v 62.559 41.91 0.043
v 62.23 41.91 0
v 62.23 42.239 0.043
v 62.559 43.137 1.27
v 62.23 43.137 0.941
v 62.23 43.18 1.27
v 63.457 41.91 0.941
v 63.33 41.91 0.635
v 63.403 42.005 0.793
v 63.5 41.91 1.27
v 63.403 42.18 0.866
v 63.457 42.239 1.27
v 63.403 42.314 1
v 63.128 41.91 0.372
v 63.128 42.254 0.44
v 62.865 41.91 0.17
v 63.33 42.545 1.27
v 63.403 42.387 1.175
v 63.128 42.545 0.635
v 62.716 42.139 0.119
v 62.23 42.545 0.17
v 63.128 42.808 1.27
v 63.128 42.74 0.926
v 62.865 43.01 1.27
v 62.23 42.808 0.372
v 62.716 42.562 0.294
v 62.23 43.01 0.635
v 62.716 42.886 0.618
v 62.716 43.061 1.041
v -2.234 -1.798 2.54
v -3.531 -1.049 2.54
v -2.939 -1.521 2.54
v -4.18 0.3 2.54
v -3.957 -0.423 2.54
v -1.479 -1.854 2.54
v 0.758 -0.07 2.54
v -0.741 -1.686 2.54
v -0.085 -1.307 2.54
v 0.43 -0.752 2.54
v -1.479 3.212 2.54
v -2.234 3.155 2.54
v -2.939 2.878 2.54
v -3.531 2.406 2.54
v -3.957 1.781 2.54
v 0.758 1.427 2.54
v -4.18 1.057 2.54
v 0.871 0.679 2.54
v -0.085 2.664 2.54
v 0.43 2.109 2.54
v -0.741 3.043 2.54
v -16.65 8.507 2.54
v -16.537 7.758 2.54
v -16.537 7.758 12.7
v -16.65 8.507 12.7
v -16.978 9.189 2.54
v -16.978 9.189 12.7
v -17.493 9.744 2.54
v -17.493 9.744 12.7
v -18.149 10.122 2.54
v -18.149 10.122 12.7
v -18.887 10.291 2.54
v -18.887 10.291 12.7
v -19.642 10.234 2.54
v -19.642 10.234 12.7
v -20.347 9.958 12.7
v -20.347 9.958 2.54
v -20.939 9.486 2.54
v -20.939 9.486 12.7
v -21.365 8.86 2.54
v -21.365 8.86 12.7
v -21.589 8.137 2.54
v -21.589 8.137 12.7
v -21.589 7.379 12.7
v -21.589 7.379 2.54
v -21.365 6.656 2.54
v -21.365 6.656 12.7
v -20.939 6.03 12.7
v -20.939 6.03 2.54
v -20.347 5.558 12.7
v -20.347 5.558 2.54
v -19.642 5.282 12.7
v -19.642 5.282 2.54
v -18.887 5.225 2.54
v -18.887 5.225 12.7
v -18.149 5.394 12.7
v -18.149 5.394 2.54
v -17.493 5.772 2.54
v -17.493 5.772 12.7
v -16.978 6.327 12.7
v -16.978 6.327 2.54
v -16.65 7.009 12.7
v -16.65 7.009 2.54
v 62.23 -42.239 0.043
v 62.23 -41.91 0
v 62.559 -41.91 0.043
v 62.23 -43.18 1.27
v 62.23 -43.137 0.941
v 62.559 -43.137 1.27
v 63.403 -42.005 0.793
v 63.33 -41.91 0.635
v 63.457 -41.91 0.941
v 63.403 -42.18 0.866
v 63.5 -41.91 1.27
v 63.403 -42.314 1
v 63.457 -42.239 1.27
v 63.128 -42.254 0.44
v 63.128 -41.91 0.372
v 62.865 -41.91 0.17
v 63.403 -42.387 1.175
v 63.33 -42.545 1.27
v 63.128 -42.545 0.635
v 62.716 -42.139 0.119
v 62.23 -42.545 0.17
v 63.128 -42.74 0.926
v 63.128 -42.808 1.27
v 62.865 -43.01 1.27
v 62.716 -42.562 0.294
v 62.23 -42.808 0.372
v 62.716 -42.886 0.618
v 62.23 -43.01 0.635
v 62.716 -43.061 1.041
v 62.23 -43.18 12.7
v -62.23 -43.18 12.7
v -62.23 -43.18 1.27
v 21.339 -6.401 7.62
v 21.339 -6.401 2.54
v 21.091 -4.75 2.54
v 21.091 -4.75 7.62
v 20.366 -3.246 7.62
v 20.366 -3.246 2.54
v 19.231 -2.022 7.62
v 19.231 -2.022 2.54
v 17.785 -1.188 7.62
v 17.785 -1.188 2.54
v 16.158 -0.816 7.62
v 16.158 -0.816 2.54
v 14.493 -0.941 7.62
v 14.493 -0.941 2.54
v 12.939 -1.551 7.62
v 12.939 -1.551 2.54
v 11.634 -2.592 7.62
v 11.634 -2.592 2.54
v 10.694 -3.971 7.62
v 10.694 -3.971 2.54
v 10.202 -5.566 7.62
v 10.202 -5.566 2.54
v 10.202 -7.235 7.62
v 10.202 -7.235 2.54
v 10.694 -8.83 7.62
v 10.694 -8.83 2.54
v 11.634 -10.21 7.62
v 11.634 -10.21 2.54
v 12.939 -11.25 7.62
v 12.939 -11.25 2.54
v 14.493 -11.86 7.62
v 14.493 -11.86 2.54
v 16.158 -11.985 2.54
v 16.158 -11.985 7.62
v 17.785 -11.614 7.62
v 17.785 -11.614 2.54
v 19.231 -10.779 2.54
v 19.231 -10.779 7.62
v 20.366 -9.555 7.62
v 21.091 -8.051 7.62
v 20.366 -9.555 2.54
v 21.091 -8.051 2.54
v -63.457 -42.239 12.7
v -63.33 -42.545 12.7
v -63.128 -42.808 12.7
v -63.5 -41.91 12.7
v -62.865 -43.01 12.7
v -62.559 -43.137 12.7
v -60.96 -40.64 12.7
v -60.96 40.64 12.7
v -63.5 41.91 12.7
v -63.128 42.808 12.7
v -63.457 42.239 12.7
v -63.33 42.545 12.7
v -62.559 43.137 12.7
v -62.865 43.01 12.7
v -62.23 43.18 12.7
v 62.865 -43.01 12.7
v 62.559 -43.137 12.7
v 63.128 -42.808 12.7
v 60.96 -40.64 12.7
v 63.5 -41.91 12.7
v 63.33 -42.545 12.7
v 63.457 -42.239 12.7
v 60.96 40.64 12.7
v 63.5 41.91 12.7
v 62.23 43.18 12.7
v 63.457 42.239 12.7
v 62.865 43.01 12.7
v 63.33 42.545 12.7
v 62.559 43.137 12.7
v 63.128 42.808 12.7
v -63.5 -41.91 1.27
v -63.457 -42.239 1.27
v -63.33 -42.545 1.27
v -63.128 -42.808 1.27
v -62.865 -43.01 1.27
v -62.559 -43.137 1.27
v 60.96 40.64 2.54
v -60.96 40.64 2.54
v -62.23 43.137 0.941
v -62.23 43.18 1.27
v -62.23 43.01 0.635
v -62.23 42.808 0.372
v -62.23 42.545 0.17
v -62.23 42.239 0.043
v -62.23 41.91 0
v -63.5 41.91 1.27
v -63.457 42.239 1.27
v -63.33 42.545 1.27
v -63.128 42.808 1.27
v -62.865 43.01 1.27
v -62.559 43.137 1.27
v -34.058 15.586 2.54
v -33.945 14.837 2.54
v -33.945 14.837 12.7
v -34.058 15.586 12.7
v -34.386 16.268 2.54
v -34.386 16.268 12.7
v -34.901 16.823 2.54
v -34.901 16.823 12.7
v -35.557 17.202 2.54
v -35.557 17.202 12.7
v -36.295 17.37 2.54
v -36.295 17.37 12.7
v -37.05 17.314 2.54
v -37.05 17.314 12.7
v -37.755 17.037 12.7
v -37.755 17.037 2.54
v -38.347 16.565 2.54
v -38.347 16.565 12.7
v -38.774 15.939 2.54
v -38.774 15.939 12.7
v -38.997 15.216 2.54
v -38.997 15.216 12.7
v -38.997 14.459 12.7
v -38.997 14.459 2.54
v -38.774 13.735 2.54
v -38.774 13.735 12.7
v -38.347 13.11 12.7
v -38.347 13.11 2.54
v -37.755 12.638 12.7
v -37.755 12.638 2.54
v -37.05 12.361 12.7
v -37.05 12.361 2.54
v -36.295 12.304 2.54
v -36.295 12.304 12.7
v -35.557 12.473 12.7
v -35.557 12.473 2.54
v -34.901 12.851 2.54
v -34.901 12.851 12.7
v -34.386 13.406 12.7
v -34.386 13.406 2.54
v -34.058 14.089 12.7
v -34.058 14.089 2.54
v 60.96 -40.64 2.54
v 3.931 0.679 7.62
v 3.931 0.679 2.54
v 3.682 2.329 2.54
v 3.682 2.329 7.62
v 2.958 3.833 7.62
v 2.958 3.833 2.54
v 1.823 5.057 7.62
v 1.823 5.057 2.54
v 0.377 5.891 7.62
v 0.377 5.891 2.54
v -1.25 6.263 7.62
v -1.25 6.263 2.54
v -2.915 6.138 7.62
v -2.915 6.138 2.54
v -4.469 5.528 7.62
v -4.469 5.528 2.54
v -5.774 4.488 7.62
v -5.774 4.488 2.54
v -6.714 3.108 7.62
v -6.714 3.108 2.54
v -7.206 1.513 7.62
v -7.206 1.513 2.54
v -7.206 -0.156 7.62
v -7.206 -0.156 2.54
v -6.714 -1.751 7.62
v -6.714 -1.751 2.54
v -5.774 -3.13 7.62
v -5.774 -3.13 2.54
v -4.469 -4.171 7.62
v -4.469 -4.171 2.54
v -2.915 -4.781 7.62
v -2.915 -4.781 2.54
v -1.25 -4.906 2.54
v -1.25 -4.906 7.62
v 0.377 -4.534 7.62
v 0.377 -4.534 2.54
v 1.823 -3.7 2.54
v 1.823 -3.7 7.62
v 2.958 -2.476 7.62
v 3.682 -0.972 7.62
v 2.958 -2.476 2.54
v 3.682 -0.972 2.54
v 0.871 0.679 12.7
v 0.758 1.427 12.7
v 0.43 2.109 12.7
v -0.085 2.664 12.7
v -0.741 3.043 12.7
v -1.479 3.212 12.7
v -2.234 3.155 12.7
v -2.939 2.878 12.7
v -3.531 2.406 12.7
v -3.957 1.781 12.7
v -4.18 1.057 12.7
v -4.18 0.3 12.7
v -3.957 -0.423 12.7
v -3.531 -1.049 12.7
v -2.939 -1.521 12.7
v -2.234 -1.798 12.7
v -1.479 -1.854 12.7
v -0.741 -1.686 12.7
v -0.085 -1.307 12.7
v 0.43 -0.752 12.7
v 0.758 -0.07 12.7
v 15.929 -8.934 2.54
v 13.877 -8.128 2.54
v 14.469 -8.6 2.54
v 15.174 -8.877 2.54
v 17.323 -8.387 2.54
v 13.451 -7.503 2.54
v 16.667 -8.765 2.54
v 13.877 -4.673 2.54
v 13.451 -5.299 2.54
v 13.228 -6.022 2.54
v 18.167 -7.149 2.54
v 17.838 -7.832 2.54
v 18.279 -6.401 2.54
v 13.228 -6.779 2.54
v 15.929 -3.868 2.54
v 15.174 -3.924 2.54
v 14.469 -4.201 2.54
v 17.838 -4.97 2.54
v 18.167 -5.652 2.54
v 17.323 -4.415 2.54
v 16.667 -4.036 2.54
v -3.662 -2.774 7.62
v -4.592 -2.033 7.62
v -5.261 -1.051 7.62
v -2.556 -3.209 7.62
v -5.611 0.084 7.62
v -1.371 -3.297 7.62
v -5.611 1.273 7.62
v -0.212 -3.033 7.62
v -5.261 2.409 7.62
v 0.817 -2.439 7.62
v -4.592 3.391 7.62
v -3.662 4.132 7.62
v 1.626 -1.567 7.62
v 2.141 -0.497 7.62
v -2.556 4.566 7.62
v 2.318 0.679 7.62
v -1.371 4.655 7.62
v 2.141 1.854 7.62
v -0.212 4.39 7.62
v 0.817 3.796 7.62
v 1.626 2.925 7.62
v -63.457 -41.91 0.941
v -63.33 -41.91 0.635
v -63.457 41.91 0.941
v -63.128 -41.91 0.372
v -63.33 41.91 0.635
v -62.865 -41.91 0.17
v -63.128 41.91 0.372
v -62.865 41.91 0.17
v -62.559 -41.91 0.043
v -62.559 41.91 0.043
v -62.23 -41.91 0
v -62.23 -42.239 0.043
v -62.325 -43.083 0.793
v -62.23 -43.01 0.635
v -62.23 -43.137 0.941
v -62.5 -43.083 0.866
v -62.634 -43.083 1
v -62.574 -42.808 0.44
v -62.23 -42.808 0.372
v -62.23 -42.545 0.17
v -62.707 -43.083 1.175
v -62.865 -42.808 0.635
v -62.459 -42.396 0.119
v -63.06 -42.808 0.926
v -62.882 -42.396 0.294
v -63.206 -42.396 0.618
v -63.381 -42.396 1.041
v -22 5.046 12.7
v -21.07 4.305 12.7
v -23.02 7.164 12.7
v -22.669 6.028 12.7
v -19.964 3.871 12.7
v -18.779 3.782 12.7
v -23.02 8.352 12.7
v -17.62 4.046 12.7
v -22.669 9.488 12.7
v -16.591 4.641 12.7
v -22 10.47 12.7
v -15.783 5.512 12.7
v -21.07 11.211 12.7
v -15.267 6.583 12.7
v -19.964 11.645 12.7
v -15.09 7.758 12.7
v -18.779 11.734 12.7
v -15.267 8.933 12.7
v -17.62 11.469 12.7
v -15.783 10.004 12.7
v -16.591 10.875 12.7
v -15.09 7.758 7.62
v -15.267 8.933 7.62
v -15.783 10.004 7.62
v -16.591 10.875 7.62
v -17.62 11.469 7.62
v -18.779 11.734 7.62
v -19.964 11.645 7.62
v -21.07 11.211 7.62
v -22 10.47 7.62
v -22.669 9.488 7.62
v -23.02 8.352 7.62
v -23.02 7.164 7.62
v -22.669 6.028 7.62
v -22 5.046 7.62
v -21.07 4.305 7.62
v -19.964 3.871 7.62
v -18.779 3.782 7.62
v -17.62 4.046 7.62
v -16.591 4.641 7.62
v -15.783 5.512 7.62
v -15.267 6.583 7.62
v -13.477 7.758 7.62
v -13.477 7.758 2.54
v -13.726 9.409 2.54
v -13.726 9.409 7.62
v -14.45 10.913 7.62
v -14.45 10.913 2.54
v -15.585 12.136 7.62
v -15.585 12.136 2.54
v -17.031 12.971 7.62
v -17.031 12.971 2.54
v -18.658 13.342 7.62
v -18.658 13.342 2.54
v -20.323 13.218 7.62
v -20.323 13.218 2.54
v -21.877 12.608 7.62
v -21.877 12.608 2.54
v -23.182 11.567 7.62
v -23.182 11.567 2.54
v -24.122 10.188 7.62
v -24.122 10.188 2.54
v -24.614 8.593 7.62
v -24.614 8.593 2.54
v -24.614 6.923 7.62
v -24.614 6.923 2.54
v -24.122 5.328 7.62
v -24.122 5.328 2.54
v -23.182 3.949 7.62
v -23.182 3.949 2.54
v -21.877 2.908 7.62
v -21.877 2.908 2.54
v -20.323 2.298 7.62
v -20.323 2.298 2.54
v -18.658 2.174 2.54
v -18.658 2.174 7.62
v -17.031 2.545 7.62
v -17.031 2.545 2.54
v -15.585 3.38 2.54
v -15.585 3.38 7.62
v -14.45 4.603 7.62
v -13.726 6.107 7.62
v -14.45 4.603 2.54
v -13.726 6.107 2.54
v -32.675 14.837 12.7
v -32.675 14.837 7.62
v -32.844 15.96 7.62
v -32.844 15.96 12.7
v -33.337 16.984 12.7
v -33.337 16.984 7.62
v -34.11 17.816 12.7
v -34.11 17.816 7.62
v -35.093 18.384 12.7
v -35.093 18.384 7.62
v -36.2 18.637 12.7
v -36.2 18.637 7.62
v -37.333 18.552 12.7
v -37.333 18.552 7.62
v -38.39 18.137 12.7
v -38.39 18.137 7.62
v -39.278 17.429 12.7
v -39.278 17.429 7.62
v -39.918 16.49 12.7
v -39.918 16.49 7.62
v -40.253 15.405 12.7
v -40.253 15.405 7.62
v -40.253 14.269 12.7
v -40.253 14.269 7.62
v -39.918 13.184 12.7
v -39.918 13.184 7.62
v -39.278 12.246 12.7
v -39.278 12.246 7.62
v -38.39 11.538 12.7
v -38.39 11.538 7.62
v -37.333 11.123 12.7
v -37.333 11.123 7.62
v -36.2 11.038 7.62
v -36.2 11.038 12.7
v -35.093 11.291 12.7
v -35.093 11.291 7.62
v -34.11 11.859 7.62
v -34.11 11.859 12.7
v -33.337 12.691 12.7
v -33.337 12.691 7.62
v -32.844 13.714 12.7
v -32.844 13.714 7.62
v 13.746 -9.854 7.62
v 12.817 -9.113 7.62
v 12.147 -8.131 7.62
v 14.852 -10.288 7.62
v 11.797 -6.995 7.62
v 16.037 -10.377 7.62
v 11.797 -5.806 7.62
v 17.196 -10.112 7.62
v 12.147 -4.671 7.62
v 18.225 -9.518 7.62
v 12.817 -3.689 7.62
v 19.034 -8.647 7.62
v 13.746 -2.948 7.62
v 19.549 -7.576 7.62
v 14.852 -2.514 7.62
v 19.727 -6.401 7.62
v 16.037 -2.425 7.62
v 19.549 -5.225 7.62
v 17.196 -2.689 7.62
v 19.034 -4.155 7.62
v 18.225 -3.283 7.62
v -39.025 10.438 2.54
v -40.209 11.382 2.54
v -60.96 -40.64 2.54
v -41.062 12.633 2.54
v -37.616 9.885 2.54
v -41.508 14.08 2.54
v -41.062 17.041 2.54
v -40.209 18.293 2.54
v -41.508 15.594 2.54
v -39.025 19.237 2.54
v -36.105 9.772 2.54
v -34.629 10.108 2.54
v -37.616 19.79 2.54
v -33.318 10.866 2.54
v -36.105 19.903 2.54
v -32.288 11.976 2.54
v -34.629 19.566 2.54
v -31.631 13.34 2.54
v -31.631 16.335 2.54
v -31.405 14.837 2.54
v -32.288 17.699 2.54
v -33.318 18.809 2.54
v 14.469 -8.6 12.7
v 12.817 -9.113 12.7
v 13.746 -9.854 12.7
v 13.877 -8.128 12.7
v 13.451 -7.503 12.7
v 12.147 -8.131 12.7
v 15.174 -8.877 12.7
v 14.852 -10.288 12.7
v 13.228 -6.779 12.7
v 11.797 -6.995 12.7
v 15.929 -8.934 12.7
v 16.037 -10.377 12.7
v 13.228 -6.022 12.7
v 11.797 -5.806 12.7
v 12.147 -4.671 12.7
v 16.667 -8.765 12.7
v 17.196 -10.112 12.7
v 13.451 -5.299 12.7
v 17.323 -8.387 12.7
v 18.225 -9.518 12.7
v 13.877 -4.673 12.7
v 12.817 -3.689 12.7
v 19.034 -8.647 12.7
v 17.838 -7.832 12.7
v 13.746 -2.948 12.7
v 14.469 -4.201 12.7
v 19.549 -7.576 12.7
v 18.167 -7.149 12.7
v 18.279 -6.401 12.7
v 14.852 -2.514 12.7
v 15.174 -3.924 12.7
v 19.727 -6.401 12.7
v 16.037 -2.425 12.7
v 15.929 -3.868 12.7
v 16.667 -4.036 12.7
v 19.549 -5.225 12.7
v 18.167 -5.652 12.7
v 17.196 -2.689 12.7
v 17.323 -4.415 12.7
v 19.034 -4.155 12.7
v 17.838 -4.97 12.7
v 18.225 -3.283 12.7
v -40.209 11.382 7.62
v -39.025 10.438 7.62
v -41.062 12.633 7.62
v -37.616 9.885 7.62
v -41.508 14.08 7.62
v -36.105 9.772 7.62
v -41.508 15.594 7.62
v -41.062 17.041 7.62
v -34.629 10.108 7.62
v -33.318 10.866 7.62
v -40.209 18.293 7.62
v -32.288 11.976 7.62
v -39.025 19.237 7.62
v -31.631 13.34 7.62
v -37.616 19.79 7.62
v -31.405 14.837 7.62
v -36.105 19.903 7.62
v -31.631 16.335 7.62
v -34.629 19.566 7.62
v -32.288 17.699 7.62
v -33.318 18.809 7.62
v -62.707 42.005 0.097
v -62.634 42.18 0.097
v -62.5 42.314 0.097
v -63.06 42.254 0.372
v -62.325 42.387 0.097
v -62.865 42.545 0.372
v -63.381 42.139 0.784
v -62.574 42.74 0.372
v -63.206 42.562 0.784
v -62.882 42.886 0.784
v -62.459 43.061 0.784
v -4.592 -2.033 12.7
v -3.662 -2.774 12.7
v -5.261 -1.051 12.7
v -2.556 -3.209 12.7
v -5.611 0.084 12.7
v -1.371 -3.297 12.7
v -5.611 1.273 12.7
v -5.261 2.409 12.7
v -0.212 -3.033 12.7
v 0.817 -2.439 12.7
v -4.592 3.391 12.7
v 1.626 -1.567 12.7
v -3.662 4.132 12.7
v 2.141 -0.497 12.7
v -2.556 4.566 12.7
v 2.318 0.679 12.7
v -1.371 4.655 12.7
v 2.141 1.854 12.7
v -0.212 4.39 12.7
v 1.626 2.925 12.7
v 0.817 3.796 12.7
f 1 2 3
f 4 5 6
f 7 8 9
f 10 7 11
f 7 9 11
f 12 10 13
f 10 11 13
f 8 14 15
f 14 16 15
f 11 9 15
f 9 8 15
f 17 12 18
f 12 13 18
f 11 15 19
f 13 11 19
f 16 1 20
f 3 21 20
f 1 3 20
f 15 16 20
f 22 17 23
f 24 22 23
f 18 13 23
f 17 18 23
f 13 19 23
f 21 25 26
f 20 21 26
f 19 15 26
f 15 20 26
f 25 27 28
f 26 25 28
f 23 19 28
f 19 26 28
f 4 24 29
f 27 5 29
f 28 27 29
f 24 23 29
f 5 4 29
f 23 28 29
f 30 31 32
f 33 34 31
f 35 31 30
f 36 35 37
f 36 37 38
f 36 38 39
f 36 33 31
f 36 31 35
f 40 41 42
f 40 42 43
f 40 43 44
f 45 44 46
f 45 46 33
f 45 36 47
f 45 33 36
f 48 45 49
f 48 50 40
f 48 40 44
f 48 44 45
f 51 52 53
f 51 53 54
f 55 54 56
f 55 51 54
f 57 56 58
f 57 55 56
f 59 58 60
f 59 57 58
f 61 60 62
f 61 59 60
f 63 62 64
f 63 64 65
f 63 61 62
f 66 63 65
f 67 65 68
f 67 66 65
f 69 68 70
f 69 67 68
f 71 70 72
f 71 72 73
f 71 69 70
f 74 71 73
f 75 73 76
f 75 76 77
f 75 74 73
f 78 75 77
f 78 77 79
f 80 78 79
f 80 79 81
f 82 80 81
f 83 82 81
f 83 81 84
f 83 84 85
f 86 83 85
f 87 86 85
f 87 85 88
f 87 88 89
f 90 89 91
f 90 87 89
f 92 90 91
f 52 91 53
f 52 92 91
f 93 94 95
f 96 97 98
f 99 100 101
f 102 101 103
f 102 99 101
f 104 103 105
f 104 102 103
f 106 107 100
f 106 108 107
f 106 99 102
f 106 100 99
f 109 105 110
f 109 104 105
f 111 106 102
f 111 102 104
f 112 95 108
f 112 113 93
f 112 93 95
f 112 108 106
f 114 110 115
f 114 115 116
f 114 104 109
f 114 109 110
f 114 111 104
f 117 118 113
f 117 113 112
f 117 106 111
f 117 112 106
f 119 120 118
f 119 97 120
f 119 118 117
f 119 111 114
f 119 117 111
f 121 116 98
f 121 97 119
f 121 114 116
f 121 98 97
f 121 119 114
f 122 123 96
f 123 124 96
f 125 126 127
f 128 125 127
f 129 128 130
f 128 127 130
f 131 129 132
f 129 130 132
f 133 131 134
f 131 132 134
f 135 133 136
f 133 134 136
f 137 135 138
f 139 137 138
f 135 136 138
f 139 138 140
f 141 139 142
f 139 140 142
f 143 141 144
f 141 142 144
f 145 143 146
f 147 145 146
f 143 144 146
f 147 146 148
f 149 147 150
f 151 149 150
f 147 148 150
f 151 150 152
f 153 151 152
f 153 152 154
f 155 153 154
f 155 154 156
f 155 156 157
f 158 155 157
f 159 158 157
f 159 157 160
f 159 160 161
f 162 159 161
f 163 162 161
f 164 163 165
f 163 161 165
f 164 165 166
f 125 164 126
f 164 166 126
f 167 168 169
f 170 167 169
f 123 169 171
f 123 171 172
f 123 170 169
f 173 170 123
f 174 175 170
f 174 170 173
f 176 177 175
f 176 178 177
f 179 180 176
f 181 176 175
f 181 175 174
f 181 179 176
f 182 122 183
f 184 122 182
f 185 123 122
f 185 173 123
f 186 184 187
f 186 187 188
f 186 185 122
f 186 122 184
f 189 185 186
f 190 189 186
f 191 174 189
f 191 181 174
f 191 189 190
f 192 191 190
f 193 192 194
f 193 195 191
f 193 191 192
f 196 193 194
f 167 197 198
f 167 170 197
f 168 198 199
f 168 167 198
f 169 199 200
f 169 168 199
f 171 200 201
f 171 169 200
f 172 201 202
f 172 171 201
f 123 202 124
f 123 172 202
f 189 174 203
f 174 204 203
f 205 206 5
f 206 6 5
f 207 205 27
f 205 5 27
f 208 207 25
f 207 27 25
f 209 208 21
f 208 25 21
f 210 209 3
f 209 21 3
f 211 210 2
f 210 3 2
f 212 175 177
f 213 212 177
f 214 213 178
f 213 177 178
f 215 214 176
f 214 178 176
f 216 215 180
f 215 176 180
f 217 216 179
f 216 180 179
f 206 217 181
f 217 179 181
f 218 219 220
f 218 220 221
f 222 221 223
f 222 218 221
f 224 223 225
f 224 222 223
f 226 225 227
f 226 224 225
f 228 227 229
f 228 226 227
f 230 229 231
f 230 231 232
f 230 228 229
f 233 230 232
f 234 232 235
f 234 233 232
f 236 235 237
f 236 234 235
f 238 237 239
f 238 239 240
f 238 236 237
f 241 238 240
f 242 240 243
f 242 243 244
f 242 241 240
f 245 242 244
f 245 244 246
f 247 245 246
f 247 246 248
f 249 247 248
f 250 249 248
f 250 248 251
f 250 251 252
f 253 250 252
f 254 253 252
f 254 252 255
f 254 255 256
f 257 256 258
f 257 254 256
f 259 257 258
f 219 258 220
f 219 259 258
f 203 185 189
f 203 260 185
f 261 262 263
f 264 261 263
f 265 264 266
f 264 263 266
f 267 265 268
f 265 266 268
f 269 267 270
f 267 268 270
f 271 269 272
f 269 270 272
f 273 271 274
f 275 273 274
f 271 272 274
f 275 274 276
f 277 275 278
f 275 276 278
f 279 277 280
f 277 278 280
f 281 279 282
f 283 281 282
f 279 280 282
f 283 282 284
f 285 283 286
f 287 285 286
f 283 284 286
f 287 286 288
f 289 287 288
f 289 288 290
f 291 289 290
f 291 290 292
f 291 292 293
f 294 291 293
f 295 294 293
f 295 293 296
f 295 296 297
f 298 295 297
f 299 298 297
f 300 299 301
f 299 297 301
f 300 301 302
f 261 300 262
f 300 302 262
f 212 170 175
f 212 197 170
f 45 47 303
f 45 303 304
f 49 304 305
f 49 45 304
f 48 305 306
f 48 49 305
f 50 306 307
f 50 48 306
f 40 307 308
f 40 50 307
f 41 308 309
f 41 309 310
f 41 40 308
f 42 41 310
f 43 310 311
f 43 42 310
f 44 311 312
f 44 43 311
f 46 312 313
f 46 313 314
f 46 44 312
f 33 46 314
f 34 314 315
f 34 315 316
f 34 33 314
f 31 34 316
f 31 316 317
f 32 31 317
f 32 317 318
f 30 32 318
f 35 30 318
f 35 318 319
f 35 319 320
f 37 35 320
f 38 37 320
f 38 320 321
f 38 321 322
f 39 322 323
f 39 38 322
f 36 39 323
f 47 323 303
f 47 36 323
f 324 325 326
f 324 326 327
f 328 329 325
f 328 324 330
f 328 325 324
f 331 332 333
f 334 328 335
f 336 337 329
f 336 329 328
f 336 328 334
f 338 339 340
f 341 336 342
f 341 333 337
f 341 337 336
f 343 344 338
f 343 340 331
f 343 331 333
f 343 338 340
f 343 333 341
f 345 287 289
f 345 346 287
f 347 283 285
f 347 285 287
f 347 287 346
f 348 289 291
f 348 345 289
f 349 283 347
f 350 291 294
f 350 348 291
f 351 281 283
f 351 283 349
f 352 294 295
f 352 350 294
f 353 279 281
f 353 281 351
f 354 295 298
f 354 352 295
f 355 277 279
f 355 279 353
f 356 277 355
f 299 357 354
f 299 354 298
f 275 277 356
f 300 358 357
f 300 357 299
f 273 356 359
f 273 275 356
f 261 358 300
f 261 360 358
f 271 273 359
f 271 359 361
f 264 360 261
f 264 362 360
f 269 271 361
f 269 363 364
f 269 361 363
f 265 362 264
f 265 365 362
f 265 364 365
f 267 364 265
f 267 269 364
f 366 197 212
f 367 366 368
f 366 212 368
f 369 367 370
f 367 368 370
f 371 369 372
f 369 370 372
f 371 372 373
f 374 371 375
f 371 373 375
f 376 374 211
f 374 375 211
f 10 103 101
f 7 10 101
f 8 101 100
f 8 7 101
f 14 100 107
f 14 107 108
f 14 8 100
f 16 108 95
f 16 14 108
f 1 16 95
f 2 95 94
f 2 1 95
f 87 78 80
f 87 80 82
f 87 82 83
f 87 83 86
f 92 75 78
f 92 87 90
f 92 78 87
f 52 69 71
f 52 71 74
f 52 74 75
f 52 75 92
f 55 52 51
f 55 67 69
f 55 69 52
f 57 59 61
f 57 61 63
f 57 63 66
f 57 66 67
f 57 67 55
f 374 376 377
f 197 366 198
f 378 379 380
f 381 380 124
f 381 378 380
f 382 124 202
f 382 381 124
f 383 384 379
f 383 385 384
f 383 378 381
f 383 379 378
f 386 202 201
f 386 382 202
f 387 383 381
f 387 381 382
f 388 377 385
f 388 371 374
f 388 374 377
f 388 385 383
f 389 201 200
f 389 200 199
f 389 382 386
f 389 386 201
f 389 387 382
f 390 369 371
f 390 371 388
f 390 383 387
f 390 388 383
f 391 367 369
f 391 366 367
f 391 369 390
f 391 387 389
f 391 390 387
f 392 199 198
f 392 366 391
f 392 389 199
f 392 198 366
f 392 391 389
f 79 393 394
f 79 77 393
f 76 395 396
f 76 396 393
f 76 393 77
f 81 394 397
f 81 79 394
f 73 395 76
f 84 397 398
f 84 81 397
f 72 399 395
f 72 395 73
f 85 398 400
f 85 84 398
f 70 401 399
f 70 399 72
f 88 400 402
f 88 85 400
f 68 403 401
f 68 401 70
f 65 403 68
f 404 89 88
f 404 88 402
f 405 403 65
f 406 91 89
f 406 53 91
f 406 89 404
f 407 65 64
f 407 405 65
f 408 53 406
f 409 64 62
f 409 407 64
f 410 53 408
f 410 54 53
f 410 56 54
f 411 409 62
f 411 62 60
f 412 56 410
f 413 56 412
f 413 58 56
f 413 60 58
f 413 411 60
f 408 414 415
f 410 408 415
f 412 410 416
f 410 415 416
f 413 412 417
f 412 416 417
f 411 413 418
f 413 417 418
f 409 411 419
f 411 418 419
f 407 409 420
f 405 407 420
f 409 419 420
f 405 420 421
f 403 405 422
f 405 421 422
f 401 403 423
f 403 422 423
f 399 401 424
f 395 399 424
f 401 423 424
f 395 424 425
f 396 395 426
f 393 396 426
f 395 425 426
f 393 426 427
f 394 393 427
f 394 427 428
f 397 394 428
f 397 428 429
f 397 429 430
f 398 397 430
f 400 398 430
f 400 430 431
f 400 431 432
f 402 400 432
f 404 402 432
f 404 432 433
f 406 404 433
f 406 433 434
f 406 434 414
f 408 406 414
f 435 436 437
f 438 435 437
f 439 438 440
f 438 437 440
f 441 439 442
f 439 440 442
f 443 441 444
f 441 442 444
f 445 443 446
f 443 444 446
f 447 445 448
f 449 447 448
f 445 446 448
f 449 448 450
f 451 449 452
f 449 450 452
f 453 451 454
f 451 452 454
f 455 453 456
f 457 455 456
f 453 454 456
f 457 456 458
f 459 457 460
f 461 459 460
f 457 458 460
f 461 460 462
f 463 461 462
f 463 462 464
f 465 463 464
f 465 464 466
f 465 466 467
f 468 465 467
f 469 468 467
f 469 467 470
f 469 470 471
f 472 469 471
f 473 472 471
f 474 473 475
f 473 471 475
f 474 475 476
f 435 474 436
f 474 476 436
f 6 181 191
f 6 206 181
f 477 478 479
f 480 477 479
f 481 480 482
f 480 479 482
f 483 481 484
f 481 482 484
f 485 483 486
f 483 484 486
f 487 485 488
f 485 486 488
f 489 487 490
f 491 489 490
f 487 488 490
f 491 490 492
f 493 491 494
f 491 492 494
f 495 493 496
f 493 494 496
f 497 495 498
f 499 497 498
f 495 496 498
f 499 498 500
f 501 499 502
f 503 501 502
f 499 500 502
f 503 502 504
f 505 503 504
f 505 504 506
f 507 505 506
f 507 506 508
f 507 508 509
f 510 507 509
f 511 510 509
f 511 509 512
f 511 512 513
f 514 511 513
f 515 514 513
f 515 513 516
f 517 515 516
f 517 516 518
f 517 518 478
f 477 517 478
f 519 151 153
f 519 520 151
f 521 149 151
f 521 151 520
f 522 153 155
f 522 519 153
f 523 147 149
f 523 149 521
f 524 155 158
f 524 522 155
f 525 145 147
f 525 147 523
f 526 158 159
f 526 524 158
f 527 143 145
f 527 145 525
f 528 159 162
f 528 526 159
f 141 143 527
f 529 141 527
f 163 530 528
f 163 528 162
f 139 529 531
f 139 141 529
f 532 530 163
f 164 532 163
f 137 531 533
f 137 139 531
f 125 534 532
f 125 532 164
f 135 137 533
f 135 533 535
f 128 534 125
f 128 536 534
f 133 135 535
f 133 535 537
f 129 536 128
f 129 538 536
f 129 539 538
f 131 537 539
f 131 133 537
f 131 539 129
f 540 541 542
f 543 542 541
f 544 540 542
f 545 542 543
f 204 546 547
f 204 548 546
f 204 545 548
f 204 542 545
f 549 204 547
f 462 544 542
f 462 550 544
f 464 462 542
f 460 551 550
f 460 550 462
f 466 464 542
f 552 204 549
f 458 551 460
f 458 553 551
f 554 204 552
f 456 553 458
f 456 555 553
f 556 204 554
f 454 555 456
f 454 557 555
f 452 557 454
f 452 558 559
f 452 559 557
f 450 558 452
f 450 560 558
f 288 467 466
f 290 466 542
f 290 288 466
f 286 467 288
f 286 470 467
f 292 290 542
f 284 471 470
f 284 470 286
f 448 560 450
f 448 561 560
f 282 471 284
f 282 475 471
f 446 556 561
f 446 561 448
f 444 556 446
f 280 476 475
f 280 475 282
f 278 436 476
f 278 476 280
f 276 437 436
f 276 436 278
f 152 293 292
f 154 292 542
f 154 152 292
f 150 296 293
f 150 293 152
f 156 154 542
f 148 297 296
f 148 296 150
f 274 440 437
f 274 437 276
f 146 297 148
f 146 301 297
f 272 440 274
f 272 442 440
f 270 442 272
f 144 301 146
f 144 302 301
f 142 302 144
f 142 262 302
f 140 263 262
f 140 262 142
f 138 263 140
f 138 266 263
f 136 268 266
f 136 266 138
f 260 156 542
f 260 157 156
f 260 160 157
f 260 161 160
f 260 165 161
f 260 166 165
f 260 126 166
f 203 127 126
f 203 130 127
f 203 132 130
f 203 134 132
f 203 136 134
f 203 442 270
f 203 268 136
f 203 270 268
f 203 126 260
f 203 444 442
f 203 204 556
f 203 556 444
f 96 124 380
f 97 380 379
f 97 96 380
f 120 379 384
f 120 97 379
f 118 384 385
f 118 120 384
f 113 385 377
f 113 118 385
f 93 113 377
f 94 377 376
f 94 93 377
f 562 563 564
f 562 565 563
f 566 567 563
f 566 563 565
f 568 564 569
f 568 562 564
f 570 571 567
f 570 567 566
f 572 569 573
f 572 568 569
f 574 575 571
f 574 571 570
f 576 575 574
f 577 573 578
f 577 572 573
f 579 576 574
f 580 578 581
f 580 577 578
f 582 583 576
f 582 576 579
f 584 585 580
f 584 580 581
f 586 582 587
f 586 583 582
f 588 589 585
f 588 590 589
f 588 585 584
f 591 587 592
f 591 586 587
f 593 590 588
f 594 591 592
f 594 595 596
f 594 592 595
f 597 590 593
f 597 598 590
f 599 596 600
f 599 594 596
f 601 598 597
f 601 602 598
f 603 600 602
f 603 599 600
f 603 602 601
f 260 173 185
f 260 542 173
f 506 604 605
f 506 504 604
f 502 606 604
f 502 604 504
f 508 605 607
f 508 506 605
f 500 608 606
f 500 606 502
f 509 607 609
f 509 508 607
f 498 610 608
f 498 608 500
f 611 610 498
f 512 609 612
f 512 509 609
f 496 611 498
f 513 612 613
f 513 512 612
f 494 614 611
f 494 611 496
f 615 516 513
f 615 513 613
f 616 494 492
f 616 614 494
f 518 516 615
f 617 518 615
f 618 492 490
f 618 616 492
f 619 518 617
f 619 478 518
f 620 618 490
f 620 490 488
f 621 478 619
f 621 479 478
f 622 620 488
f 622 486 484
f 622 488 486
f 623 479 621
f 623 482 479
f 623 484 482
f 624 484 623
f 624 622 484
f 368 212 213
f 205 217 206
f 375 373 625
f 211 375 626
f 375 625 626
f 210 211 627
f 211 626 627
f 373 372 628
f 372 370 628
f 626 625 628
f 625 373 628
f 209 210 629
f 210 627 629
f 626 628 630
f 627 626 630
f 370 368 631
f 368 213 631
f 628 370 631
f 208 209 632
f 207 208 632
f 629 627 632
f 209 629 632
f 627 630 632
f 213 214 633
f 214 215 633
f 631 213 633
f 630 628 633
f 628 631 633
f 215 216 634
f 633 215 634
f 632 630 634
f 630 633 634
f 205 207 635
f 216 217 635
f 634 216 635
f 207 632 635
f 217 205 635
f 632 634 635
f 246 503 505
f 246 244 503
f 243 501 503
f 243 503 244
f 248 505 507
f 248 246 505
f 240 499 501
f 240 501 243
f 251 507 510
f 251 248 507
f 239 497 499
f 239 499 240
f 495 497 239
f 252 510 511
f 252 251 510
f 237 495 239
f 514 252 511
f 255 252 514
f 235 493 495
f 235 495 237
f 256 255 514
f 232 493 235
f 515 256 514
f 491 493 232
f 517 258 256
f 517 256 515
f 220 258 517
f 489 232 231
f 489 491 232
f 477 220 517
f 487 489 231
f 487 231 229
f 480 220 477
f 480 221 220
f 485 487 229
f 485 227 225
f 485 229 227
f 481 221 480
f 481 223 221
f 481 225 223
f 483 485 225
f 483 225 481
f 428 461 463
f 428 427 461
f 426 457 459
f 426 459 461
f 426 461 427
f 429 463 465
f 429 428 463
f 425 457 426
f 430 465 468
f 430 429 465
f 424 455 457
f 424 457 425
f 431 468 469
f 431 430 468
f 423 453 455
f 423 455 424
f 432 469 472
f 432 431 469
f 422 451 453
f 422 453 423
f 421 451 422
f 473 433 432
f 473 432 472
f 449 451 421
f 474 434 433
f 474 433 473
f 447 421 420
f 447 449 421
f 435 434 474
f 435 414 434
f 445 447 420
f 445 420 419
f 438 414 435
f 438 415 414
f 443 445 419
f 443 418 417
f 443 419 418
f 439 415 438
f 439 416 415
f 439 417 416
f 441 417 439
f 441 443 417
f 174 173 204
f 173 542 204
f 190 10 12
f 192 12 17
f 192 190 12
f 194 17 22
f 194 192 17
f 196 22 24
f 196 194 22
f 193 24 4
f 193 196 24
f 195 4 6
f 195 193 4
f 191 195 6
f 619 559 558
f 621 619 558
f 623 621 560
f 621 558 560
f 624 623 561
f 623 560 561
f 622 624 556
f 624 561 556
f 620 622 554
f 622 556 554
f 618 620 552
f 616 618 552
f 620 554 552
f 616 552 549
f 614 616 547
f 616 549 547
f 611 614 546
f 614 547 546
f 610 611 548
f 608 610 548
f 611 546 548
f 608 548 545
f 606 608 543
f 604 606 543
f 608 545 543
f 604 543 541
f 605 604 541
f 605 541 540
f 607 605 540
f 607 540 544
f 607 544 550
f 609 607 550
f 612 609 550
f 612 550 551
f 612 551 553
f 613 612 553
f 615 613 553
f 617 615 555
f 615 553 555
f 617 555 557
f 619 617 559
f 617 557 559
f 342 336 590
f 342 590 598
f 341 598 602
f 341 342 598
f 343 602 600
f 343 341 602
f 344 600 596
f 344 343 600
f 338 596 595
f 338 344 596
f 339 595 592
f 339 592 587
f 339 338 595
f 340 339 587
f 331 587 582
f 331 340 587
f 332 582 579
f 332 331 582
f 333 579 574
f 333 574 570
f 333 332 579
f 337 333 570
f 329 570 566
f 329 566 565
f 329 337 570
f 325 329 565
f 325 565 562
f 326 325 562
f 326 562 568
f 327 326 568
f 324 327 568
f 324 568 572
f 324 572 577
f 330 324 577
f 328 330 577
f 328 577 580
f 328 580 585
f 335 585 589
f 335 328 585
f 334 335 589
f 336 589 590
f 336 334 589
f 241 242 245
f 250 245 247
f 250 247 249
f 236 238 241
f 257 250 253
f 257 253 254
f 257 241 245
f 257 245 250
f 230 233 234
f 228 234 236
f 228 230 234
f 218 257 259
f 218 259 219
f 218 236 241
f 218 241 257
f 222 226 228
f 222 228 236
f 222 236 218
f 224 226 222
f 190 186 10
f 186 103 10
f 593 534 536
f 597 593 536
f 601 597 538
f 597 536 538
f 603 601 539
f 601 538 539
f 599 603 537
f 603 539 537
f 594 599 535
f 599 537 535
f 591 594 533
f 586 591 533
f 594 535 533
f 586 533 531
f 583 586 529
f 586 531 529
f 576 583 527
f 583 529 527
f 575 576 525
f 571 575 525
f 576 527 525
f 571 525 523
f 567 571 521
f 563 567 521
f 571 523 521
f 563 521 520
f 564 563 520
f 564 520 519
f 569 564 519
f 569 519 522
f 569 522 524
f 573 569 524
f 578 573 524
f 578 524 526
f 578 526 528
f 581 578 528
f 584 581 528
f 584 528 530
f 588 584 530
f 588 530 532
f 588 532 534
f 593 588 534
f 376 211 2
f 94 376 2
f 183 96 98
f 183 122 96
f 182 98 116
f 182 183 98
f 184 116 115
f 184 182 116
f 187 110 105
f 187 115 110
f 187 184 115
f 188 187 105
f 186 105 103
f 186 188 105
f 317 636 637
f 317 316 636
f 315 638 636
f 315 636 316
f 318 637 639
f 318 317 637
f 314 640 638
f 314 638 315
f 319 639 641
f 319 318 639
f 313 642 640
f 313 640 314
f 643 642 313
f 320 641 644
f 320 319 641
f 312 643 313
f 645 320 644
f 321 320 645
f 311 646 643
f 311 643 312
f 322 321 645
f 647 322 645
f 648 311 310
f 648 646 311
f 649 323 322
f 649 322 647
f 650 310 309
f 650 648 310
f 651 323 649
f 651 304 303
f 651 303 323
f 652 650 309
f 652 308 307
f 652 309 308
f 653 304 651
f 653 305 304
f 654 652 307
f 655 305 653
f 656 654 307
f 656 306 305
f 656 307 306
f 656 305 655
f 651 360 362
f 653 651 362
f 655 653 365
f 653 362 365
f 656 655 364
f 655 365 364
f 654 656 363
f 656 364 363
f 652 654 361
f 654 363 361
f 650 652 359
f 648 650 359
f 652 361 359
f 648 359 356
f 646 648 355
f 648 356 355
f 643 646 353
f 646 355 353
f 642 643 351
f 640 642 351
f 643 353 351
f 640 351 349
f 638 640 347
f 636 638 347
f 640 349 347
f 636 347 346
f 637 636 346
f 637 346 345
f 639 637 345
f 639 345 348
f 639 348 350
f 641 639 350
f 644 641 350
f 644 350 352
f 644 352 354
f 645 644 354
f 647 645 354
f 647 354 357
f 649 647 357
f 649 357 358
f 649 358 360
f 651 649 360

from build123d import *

# Parameters (mm, degrees)
F0_W     = 127
F0_H     = 86.36
F1_DEPTH = 12.7
F2_T     = -2.54
F3_R     = 1.27
F4_R     = 3.81
F4_R_2   = 2.54
F4_R_3   = 3.987123
F5_DEPTH = 10.16
F4_R_4   = 5.08
F4_R_5   = 5.599952
F6_DEPTH = 5.08
F7_DEPTH = 10.16
F8_DEPTH = 5.08


with BuildPart() as f1:
    # F0 (on Top) → F1 (new body)
    with BuildSketch(Plane.XY):
        Rectangle(F0_W, F0_H)
    extrude(amount=F1_DEPTH)

    # F2
    f2_openings = [f1.faces().sort_by_distance(p)[0] for p in [
        (0, 0, 12.7),
    ]]
    offset(amount=F2_T, openings=f2_openings)

    # F3
    f3_edges = [f1.edges().sort_by_distance(p)[0] for p in [
        (-63.5, 43.18, 6.35),
        (-63.5, 0, 0),
        (0, -43.18, 0),
        (0, 43.18, 0),
        (63.5, 0, 0),
        (63.5, 43.18, 6.35),
        (63.5, -43.18, 6.35),
        (-63.5, -43.18, 6.35),
    ]]
    fillet(f3_edges, radius=F3_R)

    # F4 (on face) → F5 (join)
    with BuildSketch(Plane.XY.offset(2.54)):
        with Locations((-36.485116, 14.837309)):
            Circle(F4_R)
        with Locations((-36.485116, 14.837309)):
            Circle(F4_R_2, mode=Mode.SUBTRACT)
        with Locations((-1.668755, 0.678628)):
            Circle(F4_R_3)
        with Locations((-1.668755, 0.678628)):
            Circle(F4_R_2, mode=Mode.SUBTRACT)
    extrude(amount=F5_DEPTH)

    # F4 (on face) → F6 (join)
    with BuildSketch(Plane.XY.offset(2.54)):
        with Locations((-36.485116, 14.837309)):
            Circle(F4_R_4)
        with Locations((-36.485116, 14.837309)):
            Circle(F4_R, mode=Mode.SUBTRACT)
        with Locations((-1.668755, 0.678628)):
            Circle(F4_R_5)
        with Locations((-1.668755, 0.678628)):
            Circle(F4_R_3, mode=Mode.SUBTRACT)
    extrude(amount=F6_DEPTH)

    # F4 (on face) → F7 (join)
    with BuildSketch(Plane.XY.offset(2.54)):
        with Locations((-19.076936, 7.757969)):
            Circle(F4_R_3)
        with Locations((-19.076936, 7.757969)):
            Circle(F4_R_2, mode=Mode.SUBTRACT)
        with Locations((15.739425, -6.400712)):
            Circle(F4_R_3)
        with Locations((15.739425, -6.400712)):
            Circle(F4_R_2, mode=Mode.SUBTRACT)
    extrude(amount=F7_DEPTH)

    # F4 (on face) → F8 (join)
    with BuildSketch(Plane.XY.offset(2.54)):
        with Locations((-19.076936, 7.757969)):
            Circle(F4_R_5)
        with Locations((-19.076936, 7.757969)):
            Circle(F4_R_3, mode=Mode.SUBTRACT)
        with Locations((15.739425, -6.400712)):
            Circle(F4_R_5)
        with Locations((15.739425, -6.400712)):
            Circle(F4_R_3, mode=Mode.SUBTRACT)
    extrude(amount=F8_DEPTH)


solid = f1.part
